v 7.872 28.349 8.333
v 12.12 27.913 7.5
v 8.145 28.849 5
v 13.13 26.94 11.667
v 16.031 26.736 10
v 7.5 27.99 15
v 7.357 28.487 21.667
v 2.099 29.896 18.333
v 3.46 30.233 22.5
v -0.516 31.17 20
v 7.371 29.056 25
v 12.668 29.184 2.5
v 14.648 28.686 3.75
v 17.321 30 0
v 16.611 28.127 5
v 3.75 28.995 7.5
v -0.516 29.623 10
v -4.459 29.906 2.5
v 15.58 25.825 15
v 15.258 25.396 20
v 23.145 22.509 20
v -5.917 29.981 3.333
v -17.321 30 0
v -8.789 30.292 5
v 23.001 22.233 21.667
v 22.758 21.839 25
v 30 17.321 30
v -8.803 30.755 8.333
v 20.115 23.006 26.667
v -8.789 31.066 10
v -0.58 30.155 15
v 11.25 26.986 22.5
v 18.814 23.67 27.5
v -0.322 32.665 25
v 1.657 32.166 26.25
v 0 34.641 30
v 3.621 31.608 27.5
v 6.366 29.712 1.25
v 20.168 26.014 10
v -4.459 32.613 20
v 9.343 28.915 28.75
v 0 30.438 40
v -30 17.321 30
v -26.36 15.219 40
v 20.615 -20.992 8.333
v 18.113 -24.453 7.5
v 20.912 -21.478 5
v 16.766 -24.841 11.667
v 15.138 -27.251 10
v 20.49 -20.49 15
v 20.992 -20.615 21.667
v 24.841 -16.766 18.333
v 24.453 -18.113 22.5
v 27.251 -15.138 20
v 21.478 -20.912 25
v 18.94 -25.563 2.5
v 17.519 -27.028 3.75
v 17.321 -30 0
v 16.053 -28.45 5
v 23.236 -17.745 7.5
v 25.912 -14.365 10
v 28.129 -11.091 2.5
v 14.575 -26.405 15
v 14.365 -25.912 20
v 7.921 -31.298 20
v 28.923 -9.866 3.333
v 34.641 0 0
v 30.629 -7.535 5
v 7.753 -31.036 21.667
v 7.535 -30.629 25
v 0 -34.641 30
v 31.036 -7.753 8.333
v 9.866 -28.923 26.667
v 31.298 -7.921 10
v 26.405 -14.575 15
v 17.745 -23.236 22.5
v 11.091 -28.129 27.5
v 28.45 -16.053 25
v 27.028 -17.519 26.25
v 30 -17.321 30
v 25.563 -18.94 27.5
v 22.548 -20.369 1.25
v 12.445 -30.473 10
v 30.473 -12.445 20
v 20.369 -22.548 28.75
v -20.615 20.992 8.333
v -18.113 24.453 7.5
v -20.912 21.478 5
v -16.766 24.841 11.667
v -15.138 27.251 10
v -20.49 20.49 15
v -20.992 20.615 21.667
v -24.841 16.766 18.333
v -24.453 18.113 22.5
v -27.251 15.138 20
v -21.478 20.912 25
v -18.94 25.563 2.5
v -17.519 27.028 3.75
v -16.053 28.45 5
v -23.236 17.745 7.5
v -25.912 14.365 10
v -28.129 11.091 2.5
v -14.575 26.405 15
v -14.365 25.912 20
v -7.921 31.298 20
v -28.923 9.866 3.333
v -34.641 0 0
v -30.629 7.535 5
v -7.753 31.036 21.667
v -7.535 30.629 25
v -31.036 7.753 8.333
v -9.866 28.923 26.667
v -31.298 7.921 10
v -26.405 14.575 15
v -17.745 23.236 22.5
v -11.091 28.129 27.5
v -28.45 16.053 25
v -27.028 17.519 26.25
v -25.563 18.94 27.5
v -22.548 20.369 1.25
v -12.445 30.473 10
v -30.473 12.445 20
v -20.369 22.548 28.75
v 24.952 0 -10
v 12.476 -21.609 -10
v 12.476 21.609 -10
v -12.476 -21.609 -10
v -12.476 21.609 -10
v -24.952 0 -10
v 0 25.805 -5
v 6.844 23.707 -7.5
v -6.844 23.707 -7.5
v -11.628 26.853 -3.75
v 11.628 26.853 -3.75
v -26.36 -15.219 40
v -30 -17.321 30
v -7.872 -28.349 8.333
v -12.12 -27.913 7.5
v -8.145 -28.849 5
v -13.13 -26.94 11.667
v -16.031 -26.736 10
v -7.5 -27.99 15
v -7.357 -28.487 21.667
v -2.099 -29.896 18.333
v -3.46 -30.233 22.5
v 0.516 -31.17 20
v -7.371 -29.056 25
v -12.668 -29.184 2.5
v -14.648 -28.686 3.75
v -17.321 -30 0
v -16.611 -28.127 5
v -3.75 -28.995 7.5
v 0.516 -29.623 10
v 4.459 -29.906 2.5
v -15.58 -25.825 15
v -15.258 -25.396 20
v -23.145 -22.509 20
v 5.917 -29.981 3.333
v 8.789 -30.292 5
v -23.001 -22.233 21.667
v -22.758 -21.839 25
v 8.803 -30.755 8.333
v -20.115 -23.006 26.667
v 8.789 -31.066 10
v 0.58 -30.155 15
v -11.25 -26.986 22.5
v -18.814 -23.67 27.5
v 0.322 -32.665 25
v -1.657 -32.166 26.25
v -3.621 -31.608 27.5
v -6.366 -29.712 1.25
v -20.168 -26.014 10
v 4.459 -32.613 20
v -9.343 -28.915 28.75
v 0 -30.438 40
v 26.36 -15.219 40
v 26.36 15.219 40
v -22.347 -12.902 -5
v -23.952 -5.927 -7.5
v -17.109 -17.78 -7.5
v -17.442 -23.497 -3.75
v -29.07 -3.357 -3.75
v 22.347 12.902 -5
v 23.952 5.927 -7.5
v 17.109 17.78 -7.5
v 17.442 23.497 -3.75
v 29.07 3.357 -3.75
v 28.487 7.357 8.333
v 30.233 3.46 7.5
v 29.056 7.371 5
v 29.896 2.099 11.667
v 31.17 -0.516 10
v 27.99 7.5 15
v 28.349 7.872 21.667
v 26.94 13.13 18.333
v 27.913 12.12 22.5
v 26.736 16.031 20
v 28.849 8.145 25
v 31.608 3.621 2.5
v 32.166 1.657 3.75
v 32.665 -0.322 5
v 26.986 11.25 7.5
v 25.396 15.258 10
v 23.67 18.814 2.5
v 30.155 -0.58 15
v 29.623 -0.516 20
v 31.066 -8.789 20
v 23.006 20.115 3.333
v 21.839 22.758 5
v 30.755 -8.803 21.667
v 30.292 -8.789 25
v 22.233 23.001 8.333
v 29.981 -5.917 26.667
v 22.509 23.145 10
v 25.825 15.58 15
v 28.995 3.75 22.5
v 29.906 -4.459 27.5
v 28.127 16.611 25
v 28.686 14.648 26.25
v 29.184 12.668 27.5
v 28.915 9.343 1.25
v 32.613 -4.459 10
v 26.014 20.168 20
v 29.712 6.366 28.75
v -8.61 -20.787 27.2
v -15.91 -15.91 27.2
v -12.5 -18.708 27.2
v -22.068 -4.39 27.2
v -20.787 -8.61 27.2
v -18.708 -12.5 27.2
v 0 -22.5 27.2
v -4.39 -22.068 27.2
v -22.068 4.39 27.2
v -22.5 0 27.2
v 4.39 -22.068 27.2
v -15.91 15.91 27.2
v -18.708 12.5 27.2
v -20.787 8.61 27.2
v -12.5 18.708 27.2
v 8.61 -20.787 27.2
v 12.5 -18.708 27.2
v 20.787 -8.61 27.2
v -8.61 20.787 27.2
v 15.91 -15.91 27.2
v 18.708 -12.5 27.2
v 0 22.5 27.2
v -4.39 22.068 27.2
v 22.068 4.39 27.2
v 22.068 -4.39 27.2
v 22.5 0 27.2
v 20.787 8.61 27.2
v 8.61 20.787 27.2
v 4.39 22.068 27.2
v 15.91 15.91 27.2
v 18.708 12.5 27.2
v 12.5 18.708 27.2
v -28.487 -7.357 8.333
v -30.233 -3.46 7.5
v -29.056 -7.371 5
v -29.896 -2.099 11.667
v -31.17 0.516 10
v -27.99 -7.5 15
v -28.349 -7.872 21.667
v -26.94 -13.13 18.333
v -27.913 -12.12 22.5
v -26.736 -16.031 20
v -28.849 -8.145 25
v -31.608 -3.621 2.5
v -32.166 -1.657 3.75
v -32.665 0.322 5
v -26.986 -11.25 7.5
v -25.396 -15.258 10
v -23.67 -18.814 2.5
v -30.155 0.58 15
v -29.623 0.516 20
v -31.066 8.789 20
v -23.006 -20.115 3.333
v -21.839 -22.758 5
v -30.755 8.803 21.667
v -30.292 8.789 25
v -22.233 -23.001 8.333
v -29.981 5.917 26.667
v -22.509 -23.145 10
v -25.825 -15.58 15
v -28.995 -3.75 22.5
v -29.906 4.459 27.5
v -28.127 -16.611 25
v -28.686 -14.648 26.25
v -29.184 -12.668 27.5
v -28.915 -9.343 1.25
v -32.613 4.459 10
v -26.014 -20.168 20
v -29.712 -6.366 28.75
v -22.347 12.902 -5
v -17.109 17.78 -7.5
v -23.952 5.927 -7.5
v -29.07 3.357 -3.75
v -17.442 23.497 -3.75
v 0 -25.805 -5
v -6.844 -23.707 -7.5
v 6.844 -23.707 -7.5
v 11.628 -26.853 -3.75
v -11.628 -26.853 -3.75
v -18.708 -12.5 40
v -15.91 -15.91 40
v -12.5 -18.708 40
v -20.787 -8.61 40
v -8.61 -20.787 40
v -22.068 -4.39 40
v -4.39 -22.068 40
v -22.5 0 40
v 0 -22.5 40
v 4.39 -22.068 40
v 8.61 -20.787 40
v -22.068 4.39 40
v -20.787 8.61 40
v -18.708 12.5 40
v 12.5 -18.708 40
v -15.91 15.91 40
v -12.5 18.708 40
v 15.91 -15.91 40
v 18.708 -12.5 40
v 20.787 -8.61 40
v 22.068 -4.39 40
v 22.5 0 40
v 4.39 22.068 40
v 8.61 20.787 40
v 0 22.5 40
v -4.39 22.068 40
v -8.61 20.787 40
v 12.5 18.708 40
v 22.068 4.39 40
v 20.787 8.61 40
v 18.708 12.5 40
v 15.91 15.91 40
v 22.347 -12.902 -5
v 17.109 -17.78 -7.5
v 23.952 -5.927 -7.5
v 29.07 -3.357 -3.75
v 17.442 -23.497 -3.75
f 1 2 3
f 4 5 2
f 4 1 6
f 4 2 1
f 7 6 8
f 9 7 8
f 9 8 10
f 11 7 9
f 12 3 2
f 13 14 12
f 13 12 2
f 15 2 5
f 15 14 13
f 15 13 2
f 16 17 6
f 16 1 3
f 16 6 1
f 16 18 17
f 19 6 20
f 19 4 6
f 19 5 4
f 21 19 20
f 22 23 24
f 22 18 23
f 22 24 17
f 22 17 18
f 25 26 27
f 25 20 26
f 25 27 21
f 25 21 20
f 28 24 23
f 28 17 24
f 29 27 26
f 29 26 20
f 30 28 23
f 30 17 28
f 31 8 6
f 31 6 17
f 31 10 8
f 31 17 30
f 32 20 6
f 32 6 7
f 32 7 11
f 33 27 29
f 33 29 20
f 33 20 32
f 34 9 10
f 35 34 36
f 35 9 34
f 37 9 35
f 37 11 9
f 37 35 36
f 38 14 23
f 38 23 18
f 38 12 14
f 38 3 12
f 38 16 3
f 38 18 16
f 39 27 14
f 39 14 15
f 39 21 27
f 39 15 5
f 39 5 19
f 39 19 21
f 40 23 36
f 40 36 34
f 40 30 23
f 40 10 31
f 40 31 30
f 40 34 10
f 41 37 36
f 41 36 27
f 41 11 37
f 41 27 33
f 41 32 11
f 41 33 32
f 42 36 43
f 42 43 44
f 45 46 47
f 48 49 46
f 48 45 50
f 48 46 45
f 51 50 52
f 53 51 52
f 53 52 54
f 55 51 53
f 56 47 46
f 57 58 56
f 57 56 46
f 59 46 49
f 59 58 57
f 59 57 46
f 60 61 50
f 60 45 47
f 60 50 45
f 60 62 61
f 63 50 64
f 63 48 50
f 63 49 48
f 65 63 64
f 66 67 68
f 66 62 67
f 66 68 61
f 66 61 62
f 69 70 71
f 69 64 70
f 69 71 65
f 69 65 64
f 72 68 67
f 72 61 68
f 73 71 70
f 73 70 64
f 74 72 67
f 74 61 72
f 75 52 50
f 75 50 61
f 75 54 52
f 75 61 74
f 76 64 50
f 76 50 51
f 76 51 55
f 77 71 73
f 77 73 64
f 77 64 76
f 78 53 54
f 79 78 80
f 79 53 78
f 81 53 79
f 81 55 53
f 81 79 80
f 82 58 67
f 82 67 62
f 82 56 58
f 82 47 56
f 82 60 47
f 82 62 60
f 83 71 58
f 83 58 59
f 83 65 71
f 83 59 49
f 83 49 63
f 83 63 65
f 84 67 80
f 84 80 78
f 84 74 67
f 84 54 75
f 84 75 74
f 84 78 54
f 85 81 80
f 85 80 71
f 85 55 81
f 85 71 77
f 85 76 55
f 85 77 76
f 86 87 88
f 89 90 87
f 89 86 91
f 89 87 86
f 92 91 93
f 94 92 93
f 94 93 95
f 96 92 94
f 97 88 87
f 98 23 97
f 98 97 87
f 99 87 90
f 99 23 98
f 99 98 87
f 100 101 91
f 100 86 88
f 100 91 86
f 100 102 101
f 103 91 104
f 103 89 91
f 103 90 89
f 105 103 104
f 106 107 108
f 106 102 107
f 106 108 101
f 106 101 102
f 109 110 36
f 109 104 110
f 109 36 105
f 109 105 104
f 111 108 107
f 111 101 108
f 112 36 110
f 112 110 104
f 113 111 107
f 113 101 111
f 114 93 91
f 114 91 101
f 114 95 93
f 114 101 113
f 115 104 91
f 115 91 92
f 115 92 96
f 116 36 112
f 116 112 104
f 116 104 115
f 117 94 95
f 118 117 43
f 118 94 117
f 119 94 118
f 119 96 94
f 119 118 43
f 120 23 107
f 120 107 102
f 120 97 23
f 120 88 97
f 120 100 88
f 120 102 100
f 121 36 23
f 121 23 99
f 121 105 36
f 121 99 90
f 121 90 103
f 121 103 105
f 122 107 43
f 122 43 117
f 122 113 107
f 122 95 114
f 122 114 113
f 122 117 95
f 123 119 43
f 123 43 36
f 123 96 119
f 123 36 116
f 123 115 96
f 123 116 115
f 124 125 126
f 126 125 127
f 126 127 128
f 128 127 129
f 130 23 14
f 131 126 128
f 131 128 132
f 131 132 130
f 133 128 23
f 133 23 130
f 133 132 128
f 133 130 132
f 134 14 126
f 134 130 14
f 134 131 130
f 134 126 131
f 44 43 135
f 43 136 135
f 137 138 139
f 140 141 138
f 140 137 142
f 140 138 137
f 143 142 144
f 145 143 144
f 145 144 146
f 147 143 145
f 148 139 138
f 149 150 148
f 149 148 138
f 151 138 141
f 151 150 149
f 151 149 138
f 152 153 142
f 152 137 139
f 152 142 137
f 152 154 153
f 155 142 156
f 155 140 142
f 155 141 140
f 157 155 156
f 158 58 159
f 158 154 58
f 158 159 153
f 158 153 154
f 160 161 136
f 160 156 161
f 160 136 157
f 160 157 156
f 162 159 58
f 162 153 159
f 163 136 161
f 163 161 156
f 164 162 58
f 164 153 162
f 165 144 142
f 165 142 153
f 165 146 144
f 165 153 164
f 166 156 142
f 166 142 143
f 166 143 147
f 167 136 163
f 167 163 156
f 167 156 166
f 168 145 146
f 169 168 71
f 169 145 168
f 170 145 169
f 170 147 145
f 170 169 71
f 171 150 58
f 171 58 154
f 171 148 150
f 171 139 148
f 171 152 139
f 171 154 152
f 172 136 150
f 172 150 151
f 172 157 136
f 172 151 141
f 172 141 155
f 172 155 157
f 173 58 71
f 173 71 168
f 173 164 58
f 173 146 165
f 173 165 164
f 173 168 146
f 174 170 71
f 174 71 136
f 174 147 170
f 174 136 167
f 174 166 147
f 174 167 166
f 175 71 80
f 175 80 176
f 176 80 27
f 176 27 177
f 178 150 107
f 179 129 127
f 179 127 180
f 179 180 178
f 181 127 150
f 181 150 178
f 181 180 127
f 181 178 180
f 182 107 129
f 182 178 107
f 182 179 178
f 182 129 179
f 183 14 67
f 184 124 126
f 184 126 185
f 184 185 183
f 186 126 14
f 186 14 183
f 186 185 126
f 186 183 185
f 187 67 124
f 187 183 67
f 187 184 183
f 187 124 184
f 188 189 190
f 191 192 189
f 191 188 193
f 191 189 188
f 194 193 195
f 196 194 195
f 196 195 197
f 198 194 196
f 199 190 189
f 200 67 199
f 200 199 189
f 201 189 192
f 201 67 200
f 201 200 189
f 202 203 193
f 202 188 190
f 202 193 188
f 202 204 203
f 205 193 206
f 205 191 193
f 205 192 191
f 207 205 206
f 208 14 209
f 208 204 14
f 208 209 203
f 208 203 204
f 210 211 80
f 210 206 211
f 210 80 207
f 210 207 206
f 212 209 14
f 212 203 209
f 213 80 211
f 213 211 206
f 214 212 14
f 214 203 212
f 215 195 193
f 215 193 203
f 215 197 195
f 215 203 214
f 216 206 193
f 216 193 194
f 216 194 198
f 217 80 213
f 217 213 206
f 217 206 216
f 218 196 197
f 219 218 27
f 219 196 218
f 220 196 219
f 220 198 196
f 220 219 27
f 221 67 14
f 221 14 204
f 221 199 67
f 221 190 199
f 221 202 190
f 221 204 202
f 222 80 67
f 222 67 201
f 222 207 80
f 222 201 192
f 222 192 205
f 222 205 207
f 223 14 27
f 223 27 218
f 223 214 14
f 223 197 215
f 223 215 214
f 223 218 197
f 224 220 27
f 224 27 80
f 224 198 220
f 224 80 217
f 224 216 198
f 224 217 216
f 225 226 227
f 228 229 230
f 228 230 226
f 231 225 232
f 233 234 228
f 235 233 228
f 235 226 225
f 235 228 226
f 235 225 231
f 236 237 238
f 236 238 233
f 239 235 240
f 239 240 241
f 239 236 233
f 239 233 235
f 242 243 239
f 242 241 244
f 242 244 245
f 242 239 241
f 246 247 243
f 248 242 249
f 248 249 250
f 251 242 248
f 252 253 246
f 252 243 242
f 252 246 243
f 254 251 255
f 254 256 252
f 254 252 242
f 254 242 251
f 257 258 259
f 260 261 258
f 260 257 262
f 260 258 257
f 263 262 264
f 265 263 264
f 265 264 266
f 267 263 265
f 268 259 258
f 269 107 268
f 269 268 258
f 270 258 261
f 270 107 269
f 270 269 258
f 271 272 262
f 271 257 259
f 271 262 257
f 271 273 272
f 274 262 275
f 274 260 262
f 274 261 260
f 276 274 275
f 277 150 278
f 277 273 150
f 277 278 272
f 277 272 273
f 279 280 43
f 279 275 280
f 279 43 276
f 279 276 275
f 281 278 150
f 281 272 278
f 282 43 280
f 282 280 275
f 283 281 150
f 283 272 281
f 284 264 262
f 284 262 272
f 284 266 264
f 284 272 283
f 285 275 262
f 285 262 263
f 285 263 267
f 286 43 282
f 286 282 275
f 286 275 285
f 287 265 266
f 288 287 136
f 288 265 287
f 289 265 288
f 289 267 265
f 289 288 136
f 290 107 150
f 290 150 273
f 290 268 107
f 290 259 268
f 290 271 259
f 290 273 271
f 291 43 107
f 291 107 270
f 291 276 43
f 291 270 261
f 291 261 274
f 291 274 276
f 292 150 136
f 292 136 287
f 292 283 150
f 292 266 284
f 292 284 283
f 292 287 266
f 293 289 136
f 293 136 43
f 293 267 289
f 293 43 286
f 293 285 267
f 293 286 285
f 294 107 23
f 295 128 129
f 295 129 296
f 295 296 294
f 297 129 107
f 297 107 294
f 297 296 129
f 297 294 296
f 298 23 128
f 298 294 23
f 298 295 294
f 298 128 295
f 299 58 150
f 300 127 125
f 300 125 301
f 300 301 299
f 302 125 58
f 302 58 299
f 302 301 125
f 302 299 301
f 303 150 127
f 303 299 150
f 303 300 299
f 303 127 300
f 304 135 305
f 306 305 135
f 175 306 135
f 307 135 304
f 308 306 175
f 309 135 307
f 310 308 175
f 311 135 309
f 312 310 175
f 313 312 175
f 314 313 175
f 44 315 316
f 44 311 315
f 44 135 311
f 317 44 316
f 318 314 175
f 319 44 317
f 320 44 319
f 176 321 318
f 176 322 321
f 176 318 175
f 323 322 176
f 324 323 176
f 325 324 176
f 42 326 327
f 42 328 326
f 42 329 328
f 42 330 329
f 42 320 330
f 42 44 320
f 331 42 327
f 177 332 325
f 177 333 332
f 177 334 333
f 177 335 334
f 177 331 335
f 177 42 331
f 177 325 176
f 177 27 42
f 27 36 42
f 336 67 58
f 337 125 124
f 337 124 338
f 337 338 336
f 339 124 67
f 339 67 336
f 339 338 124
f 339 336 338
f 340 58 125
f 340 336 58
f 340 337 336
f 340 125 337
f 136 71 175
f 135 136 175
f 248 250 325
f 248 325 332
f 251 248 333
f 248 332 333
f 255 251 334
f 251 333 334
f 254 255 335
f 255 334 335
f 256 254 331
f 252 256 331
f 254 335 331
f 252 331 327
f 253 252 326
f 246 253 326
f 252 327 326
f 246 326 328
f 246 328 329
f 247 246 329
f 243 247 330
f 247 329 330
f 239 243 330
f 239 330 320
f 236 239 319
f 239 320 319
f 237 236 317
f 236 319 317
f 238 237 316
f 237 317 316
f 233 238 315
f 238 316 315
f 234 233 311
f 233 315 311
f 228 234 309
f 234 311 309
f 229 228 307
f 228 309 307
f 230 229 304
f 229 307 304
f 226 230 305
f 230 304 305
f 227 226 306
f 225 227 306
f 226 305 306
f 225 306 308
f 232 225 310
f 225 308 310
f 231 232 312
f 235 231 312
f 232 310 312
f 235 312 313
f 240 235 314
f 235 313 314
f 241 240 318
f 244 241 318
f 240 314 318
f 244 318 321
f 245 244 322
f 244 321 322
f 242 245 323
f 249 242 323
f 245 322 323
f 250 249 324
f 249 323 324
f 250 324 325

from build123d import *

# Parameters (mm, degrees)
F4_DEPTH = 10
F4_TAPER = 40
F5_DEPTH = 10
F5_TAPER = 20
F6_R     = 22.5
F7_DEPTH = 12.8


with BuildPart() as f3:
    # F0 (on Top) → F3 section 0
    with BuildSketch(Plane.XY):
        Polygon((34.6410161514, 0), (17.3205080757, 30), (-17.3205080757, 30), (-34.6410161514, 0), (-17.3205080757, -30), (17.3205080757, -30), align=None)
    # F2 (on offset) → F3 section 1
    with BuildSketch(Plane.XY.offset(30)):
        Polygon((0, 34.6410161514), (-30, 17.3205080757), (-30, -17.3205080757), (0, -34.6410161514), (30, -17.3205080757), (30, 17.3205080757), align=None)
    loft()

    # F3_face (on face) → F4 (join)
    with BuildSketch(Plane(origin=(0, 0, 0), x_dir=(1, 0, 0), z_dir=(0, 0, -1))):
        Polygon((17.3205080757, 30), (-17.3205080757, 30), (-34.6410161514, 0), (-17.3205080757, -30), (17.3205080757, -30), (34.6410161514, 0), align=None)
    extrude(amount=F4_DEPTH, taper=F4_TAPER)

    # F3_face1 (on face) → F5 (join)
    with BuildSketch(Plane.XY.offset(30)):
        Polygon((0, -34.6410161514), (30, -17.3205080757), (30, 17.3205080757), (0, 34.6410161514), (-30, 17.3205080757), (-30, -17.3205080757), align=None)
    extrude(amount=F5_DEPTH, taper=F5_TAPER)

    # F6 (on face) → F7 (cut)
    with BuildSketch(Plane.XY.offset(40)):
        Circle(F6_R)
    extrude(amount=-F7_DEPTH, mode=Mode.SUBTRACT)


solid = f3.part
